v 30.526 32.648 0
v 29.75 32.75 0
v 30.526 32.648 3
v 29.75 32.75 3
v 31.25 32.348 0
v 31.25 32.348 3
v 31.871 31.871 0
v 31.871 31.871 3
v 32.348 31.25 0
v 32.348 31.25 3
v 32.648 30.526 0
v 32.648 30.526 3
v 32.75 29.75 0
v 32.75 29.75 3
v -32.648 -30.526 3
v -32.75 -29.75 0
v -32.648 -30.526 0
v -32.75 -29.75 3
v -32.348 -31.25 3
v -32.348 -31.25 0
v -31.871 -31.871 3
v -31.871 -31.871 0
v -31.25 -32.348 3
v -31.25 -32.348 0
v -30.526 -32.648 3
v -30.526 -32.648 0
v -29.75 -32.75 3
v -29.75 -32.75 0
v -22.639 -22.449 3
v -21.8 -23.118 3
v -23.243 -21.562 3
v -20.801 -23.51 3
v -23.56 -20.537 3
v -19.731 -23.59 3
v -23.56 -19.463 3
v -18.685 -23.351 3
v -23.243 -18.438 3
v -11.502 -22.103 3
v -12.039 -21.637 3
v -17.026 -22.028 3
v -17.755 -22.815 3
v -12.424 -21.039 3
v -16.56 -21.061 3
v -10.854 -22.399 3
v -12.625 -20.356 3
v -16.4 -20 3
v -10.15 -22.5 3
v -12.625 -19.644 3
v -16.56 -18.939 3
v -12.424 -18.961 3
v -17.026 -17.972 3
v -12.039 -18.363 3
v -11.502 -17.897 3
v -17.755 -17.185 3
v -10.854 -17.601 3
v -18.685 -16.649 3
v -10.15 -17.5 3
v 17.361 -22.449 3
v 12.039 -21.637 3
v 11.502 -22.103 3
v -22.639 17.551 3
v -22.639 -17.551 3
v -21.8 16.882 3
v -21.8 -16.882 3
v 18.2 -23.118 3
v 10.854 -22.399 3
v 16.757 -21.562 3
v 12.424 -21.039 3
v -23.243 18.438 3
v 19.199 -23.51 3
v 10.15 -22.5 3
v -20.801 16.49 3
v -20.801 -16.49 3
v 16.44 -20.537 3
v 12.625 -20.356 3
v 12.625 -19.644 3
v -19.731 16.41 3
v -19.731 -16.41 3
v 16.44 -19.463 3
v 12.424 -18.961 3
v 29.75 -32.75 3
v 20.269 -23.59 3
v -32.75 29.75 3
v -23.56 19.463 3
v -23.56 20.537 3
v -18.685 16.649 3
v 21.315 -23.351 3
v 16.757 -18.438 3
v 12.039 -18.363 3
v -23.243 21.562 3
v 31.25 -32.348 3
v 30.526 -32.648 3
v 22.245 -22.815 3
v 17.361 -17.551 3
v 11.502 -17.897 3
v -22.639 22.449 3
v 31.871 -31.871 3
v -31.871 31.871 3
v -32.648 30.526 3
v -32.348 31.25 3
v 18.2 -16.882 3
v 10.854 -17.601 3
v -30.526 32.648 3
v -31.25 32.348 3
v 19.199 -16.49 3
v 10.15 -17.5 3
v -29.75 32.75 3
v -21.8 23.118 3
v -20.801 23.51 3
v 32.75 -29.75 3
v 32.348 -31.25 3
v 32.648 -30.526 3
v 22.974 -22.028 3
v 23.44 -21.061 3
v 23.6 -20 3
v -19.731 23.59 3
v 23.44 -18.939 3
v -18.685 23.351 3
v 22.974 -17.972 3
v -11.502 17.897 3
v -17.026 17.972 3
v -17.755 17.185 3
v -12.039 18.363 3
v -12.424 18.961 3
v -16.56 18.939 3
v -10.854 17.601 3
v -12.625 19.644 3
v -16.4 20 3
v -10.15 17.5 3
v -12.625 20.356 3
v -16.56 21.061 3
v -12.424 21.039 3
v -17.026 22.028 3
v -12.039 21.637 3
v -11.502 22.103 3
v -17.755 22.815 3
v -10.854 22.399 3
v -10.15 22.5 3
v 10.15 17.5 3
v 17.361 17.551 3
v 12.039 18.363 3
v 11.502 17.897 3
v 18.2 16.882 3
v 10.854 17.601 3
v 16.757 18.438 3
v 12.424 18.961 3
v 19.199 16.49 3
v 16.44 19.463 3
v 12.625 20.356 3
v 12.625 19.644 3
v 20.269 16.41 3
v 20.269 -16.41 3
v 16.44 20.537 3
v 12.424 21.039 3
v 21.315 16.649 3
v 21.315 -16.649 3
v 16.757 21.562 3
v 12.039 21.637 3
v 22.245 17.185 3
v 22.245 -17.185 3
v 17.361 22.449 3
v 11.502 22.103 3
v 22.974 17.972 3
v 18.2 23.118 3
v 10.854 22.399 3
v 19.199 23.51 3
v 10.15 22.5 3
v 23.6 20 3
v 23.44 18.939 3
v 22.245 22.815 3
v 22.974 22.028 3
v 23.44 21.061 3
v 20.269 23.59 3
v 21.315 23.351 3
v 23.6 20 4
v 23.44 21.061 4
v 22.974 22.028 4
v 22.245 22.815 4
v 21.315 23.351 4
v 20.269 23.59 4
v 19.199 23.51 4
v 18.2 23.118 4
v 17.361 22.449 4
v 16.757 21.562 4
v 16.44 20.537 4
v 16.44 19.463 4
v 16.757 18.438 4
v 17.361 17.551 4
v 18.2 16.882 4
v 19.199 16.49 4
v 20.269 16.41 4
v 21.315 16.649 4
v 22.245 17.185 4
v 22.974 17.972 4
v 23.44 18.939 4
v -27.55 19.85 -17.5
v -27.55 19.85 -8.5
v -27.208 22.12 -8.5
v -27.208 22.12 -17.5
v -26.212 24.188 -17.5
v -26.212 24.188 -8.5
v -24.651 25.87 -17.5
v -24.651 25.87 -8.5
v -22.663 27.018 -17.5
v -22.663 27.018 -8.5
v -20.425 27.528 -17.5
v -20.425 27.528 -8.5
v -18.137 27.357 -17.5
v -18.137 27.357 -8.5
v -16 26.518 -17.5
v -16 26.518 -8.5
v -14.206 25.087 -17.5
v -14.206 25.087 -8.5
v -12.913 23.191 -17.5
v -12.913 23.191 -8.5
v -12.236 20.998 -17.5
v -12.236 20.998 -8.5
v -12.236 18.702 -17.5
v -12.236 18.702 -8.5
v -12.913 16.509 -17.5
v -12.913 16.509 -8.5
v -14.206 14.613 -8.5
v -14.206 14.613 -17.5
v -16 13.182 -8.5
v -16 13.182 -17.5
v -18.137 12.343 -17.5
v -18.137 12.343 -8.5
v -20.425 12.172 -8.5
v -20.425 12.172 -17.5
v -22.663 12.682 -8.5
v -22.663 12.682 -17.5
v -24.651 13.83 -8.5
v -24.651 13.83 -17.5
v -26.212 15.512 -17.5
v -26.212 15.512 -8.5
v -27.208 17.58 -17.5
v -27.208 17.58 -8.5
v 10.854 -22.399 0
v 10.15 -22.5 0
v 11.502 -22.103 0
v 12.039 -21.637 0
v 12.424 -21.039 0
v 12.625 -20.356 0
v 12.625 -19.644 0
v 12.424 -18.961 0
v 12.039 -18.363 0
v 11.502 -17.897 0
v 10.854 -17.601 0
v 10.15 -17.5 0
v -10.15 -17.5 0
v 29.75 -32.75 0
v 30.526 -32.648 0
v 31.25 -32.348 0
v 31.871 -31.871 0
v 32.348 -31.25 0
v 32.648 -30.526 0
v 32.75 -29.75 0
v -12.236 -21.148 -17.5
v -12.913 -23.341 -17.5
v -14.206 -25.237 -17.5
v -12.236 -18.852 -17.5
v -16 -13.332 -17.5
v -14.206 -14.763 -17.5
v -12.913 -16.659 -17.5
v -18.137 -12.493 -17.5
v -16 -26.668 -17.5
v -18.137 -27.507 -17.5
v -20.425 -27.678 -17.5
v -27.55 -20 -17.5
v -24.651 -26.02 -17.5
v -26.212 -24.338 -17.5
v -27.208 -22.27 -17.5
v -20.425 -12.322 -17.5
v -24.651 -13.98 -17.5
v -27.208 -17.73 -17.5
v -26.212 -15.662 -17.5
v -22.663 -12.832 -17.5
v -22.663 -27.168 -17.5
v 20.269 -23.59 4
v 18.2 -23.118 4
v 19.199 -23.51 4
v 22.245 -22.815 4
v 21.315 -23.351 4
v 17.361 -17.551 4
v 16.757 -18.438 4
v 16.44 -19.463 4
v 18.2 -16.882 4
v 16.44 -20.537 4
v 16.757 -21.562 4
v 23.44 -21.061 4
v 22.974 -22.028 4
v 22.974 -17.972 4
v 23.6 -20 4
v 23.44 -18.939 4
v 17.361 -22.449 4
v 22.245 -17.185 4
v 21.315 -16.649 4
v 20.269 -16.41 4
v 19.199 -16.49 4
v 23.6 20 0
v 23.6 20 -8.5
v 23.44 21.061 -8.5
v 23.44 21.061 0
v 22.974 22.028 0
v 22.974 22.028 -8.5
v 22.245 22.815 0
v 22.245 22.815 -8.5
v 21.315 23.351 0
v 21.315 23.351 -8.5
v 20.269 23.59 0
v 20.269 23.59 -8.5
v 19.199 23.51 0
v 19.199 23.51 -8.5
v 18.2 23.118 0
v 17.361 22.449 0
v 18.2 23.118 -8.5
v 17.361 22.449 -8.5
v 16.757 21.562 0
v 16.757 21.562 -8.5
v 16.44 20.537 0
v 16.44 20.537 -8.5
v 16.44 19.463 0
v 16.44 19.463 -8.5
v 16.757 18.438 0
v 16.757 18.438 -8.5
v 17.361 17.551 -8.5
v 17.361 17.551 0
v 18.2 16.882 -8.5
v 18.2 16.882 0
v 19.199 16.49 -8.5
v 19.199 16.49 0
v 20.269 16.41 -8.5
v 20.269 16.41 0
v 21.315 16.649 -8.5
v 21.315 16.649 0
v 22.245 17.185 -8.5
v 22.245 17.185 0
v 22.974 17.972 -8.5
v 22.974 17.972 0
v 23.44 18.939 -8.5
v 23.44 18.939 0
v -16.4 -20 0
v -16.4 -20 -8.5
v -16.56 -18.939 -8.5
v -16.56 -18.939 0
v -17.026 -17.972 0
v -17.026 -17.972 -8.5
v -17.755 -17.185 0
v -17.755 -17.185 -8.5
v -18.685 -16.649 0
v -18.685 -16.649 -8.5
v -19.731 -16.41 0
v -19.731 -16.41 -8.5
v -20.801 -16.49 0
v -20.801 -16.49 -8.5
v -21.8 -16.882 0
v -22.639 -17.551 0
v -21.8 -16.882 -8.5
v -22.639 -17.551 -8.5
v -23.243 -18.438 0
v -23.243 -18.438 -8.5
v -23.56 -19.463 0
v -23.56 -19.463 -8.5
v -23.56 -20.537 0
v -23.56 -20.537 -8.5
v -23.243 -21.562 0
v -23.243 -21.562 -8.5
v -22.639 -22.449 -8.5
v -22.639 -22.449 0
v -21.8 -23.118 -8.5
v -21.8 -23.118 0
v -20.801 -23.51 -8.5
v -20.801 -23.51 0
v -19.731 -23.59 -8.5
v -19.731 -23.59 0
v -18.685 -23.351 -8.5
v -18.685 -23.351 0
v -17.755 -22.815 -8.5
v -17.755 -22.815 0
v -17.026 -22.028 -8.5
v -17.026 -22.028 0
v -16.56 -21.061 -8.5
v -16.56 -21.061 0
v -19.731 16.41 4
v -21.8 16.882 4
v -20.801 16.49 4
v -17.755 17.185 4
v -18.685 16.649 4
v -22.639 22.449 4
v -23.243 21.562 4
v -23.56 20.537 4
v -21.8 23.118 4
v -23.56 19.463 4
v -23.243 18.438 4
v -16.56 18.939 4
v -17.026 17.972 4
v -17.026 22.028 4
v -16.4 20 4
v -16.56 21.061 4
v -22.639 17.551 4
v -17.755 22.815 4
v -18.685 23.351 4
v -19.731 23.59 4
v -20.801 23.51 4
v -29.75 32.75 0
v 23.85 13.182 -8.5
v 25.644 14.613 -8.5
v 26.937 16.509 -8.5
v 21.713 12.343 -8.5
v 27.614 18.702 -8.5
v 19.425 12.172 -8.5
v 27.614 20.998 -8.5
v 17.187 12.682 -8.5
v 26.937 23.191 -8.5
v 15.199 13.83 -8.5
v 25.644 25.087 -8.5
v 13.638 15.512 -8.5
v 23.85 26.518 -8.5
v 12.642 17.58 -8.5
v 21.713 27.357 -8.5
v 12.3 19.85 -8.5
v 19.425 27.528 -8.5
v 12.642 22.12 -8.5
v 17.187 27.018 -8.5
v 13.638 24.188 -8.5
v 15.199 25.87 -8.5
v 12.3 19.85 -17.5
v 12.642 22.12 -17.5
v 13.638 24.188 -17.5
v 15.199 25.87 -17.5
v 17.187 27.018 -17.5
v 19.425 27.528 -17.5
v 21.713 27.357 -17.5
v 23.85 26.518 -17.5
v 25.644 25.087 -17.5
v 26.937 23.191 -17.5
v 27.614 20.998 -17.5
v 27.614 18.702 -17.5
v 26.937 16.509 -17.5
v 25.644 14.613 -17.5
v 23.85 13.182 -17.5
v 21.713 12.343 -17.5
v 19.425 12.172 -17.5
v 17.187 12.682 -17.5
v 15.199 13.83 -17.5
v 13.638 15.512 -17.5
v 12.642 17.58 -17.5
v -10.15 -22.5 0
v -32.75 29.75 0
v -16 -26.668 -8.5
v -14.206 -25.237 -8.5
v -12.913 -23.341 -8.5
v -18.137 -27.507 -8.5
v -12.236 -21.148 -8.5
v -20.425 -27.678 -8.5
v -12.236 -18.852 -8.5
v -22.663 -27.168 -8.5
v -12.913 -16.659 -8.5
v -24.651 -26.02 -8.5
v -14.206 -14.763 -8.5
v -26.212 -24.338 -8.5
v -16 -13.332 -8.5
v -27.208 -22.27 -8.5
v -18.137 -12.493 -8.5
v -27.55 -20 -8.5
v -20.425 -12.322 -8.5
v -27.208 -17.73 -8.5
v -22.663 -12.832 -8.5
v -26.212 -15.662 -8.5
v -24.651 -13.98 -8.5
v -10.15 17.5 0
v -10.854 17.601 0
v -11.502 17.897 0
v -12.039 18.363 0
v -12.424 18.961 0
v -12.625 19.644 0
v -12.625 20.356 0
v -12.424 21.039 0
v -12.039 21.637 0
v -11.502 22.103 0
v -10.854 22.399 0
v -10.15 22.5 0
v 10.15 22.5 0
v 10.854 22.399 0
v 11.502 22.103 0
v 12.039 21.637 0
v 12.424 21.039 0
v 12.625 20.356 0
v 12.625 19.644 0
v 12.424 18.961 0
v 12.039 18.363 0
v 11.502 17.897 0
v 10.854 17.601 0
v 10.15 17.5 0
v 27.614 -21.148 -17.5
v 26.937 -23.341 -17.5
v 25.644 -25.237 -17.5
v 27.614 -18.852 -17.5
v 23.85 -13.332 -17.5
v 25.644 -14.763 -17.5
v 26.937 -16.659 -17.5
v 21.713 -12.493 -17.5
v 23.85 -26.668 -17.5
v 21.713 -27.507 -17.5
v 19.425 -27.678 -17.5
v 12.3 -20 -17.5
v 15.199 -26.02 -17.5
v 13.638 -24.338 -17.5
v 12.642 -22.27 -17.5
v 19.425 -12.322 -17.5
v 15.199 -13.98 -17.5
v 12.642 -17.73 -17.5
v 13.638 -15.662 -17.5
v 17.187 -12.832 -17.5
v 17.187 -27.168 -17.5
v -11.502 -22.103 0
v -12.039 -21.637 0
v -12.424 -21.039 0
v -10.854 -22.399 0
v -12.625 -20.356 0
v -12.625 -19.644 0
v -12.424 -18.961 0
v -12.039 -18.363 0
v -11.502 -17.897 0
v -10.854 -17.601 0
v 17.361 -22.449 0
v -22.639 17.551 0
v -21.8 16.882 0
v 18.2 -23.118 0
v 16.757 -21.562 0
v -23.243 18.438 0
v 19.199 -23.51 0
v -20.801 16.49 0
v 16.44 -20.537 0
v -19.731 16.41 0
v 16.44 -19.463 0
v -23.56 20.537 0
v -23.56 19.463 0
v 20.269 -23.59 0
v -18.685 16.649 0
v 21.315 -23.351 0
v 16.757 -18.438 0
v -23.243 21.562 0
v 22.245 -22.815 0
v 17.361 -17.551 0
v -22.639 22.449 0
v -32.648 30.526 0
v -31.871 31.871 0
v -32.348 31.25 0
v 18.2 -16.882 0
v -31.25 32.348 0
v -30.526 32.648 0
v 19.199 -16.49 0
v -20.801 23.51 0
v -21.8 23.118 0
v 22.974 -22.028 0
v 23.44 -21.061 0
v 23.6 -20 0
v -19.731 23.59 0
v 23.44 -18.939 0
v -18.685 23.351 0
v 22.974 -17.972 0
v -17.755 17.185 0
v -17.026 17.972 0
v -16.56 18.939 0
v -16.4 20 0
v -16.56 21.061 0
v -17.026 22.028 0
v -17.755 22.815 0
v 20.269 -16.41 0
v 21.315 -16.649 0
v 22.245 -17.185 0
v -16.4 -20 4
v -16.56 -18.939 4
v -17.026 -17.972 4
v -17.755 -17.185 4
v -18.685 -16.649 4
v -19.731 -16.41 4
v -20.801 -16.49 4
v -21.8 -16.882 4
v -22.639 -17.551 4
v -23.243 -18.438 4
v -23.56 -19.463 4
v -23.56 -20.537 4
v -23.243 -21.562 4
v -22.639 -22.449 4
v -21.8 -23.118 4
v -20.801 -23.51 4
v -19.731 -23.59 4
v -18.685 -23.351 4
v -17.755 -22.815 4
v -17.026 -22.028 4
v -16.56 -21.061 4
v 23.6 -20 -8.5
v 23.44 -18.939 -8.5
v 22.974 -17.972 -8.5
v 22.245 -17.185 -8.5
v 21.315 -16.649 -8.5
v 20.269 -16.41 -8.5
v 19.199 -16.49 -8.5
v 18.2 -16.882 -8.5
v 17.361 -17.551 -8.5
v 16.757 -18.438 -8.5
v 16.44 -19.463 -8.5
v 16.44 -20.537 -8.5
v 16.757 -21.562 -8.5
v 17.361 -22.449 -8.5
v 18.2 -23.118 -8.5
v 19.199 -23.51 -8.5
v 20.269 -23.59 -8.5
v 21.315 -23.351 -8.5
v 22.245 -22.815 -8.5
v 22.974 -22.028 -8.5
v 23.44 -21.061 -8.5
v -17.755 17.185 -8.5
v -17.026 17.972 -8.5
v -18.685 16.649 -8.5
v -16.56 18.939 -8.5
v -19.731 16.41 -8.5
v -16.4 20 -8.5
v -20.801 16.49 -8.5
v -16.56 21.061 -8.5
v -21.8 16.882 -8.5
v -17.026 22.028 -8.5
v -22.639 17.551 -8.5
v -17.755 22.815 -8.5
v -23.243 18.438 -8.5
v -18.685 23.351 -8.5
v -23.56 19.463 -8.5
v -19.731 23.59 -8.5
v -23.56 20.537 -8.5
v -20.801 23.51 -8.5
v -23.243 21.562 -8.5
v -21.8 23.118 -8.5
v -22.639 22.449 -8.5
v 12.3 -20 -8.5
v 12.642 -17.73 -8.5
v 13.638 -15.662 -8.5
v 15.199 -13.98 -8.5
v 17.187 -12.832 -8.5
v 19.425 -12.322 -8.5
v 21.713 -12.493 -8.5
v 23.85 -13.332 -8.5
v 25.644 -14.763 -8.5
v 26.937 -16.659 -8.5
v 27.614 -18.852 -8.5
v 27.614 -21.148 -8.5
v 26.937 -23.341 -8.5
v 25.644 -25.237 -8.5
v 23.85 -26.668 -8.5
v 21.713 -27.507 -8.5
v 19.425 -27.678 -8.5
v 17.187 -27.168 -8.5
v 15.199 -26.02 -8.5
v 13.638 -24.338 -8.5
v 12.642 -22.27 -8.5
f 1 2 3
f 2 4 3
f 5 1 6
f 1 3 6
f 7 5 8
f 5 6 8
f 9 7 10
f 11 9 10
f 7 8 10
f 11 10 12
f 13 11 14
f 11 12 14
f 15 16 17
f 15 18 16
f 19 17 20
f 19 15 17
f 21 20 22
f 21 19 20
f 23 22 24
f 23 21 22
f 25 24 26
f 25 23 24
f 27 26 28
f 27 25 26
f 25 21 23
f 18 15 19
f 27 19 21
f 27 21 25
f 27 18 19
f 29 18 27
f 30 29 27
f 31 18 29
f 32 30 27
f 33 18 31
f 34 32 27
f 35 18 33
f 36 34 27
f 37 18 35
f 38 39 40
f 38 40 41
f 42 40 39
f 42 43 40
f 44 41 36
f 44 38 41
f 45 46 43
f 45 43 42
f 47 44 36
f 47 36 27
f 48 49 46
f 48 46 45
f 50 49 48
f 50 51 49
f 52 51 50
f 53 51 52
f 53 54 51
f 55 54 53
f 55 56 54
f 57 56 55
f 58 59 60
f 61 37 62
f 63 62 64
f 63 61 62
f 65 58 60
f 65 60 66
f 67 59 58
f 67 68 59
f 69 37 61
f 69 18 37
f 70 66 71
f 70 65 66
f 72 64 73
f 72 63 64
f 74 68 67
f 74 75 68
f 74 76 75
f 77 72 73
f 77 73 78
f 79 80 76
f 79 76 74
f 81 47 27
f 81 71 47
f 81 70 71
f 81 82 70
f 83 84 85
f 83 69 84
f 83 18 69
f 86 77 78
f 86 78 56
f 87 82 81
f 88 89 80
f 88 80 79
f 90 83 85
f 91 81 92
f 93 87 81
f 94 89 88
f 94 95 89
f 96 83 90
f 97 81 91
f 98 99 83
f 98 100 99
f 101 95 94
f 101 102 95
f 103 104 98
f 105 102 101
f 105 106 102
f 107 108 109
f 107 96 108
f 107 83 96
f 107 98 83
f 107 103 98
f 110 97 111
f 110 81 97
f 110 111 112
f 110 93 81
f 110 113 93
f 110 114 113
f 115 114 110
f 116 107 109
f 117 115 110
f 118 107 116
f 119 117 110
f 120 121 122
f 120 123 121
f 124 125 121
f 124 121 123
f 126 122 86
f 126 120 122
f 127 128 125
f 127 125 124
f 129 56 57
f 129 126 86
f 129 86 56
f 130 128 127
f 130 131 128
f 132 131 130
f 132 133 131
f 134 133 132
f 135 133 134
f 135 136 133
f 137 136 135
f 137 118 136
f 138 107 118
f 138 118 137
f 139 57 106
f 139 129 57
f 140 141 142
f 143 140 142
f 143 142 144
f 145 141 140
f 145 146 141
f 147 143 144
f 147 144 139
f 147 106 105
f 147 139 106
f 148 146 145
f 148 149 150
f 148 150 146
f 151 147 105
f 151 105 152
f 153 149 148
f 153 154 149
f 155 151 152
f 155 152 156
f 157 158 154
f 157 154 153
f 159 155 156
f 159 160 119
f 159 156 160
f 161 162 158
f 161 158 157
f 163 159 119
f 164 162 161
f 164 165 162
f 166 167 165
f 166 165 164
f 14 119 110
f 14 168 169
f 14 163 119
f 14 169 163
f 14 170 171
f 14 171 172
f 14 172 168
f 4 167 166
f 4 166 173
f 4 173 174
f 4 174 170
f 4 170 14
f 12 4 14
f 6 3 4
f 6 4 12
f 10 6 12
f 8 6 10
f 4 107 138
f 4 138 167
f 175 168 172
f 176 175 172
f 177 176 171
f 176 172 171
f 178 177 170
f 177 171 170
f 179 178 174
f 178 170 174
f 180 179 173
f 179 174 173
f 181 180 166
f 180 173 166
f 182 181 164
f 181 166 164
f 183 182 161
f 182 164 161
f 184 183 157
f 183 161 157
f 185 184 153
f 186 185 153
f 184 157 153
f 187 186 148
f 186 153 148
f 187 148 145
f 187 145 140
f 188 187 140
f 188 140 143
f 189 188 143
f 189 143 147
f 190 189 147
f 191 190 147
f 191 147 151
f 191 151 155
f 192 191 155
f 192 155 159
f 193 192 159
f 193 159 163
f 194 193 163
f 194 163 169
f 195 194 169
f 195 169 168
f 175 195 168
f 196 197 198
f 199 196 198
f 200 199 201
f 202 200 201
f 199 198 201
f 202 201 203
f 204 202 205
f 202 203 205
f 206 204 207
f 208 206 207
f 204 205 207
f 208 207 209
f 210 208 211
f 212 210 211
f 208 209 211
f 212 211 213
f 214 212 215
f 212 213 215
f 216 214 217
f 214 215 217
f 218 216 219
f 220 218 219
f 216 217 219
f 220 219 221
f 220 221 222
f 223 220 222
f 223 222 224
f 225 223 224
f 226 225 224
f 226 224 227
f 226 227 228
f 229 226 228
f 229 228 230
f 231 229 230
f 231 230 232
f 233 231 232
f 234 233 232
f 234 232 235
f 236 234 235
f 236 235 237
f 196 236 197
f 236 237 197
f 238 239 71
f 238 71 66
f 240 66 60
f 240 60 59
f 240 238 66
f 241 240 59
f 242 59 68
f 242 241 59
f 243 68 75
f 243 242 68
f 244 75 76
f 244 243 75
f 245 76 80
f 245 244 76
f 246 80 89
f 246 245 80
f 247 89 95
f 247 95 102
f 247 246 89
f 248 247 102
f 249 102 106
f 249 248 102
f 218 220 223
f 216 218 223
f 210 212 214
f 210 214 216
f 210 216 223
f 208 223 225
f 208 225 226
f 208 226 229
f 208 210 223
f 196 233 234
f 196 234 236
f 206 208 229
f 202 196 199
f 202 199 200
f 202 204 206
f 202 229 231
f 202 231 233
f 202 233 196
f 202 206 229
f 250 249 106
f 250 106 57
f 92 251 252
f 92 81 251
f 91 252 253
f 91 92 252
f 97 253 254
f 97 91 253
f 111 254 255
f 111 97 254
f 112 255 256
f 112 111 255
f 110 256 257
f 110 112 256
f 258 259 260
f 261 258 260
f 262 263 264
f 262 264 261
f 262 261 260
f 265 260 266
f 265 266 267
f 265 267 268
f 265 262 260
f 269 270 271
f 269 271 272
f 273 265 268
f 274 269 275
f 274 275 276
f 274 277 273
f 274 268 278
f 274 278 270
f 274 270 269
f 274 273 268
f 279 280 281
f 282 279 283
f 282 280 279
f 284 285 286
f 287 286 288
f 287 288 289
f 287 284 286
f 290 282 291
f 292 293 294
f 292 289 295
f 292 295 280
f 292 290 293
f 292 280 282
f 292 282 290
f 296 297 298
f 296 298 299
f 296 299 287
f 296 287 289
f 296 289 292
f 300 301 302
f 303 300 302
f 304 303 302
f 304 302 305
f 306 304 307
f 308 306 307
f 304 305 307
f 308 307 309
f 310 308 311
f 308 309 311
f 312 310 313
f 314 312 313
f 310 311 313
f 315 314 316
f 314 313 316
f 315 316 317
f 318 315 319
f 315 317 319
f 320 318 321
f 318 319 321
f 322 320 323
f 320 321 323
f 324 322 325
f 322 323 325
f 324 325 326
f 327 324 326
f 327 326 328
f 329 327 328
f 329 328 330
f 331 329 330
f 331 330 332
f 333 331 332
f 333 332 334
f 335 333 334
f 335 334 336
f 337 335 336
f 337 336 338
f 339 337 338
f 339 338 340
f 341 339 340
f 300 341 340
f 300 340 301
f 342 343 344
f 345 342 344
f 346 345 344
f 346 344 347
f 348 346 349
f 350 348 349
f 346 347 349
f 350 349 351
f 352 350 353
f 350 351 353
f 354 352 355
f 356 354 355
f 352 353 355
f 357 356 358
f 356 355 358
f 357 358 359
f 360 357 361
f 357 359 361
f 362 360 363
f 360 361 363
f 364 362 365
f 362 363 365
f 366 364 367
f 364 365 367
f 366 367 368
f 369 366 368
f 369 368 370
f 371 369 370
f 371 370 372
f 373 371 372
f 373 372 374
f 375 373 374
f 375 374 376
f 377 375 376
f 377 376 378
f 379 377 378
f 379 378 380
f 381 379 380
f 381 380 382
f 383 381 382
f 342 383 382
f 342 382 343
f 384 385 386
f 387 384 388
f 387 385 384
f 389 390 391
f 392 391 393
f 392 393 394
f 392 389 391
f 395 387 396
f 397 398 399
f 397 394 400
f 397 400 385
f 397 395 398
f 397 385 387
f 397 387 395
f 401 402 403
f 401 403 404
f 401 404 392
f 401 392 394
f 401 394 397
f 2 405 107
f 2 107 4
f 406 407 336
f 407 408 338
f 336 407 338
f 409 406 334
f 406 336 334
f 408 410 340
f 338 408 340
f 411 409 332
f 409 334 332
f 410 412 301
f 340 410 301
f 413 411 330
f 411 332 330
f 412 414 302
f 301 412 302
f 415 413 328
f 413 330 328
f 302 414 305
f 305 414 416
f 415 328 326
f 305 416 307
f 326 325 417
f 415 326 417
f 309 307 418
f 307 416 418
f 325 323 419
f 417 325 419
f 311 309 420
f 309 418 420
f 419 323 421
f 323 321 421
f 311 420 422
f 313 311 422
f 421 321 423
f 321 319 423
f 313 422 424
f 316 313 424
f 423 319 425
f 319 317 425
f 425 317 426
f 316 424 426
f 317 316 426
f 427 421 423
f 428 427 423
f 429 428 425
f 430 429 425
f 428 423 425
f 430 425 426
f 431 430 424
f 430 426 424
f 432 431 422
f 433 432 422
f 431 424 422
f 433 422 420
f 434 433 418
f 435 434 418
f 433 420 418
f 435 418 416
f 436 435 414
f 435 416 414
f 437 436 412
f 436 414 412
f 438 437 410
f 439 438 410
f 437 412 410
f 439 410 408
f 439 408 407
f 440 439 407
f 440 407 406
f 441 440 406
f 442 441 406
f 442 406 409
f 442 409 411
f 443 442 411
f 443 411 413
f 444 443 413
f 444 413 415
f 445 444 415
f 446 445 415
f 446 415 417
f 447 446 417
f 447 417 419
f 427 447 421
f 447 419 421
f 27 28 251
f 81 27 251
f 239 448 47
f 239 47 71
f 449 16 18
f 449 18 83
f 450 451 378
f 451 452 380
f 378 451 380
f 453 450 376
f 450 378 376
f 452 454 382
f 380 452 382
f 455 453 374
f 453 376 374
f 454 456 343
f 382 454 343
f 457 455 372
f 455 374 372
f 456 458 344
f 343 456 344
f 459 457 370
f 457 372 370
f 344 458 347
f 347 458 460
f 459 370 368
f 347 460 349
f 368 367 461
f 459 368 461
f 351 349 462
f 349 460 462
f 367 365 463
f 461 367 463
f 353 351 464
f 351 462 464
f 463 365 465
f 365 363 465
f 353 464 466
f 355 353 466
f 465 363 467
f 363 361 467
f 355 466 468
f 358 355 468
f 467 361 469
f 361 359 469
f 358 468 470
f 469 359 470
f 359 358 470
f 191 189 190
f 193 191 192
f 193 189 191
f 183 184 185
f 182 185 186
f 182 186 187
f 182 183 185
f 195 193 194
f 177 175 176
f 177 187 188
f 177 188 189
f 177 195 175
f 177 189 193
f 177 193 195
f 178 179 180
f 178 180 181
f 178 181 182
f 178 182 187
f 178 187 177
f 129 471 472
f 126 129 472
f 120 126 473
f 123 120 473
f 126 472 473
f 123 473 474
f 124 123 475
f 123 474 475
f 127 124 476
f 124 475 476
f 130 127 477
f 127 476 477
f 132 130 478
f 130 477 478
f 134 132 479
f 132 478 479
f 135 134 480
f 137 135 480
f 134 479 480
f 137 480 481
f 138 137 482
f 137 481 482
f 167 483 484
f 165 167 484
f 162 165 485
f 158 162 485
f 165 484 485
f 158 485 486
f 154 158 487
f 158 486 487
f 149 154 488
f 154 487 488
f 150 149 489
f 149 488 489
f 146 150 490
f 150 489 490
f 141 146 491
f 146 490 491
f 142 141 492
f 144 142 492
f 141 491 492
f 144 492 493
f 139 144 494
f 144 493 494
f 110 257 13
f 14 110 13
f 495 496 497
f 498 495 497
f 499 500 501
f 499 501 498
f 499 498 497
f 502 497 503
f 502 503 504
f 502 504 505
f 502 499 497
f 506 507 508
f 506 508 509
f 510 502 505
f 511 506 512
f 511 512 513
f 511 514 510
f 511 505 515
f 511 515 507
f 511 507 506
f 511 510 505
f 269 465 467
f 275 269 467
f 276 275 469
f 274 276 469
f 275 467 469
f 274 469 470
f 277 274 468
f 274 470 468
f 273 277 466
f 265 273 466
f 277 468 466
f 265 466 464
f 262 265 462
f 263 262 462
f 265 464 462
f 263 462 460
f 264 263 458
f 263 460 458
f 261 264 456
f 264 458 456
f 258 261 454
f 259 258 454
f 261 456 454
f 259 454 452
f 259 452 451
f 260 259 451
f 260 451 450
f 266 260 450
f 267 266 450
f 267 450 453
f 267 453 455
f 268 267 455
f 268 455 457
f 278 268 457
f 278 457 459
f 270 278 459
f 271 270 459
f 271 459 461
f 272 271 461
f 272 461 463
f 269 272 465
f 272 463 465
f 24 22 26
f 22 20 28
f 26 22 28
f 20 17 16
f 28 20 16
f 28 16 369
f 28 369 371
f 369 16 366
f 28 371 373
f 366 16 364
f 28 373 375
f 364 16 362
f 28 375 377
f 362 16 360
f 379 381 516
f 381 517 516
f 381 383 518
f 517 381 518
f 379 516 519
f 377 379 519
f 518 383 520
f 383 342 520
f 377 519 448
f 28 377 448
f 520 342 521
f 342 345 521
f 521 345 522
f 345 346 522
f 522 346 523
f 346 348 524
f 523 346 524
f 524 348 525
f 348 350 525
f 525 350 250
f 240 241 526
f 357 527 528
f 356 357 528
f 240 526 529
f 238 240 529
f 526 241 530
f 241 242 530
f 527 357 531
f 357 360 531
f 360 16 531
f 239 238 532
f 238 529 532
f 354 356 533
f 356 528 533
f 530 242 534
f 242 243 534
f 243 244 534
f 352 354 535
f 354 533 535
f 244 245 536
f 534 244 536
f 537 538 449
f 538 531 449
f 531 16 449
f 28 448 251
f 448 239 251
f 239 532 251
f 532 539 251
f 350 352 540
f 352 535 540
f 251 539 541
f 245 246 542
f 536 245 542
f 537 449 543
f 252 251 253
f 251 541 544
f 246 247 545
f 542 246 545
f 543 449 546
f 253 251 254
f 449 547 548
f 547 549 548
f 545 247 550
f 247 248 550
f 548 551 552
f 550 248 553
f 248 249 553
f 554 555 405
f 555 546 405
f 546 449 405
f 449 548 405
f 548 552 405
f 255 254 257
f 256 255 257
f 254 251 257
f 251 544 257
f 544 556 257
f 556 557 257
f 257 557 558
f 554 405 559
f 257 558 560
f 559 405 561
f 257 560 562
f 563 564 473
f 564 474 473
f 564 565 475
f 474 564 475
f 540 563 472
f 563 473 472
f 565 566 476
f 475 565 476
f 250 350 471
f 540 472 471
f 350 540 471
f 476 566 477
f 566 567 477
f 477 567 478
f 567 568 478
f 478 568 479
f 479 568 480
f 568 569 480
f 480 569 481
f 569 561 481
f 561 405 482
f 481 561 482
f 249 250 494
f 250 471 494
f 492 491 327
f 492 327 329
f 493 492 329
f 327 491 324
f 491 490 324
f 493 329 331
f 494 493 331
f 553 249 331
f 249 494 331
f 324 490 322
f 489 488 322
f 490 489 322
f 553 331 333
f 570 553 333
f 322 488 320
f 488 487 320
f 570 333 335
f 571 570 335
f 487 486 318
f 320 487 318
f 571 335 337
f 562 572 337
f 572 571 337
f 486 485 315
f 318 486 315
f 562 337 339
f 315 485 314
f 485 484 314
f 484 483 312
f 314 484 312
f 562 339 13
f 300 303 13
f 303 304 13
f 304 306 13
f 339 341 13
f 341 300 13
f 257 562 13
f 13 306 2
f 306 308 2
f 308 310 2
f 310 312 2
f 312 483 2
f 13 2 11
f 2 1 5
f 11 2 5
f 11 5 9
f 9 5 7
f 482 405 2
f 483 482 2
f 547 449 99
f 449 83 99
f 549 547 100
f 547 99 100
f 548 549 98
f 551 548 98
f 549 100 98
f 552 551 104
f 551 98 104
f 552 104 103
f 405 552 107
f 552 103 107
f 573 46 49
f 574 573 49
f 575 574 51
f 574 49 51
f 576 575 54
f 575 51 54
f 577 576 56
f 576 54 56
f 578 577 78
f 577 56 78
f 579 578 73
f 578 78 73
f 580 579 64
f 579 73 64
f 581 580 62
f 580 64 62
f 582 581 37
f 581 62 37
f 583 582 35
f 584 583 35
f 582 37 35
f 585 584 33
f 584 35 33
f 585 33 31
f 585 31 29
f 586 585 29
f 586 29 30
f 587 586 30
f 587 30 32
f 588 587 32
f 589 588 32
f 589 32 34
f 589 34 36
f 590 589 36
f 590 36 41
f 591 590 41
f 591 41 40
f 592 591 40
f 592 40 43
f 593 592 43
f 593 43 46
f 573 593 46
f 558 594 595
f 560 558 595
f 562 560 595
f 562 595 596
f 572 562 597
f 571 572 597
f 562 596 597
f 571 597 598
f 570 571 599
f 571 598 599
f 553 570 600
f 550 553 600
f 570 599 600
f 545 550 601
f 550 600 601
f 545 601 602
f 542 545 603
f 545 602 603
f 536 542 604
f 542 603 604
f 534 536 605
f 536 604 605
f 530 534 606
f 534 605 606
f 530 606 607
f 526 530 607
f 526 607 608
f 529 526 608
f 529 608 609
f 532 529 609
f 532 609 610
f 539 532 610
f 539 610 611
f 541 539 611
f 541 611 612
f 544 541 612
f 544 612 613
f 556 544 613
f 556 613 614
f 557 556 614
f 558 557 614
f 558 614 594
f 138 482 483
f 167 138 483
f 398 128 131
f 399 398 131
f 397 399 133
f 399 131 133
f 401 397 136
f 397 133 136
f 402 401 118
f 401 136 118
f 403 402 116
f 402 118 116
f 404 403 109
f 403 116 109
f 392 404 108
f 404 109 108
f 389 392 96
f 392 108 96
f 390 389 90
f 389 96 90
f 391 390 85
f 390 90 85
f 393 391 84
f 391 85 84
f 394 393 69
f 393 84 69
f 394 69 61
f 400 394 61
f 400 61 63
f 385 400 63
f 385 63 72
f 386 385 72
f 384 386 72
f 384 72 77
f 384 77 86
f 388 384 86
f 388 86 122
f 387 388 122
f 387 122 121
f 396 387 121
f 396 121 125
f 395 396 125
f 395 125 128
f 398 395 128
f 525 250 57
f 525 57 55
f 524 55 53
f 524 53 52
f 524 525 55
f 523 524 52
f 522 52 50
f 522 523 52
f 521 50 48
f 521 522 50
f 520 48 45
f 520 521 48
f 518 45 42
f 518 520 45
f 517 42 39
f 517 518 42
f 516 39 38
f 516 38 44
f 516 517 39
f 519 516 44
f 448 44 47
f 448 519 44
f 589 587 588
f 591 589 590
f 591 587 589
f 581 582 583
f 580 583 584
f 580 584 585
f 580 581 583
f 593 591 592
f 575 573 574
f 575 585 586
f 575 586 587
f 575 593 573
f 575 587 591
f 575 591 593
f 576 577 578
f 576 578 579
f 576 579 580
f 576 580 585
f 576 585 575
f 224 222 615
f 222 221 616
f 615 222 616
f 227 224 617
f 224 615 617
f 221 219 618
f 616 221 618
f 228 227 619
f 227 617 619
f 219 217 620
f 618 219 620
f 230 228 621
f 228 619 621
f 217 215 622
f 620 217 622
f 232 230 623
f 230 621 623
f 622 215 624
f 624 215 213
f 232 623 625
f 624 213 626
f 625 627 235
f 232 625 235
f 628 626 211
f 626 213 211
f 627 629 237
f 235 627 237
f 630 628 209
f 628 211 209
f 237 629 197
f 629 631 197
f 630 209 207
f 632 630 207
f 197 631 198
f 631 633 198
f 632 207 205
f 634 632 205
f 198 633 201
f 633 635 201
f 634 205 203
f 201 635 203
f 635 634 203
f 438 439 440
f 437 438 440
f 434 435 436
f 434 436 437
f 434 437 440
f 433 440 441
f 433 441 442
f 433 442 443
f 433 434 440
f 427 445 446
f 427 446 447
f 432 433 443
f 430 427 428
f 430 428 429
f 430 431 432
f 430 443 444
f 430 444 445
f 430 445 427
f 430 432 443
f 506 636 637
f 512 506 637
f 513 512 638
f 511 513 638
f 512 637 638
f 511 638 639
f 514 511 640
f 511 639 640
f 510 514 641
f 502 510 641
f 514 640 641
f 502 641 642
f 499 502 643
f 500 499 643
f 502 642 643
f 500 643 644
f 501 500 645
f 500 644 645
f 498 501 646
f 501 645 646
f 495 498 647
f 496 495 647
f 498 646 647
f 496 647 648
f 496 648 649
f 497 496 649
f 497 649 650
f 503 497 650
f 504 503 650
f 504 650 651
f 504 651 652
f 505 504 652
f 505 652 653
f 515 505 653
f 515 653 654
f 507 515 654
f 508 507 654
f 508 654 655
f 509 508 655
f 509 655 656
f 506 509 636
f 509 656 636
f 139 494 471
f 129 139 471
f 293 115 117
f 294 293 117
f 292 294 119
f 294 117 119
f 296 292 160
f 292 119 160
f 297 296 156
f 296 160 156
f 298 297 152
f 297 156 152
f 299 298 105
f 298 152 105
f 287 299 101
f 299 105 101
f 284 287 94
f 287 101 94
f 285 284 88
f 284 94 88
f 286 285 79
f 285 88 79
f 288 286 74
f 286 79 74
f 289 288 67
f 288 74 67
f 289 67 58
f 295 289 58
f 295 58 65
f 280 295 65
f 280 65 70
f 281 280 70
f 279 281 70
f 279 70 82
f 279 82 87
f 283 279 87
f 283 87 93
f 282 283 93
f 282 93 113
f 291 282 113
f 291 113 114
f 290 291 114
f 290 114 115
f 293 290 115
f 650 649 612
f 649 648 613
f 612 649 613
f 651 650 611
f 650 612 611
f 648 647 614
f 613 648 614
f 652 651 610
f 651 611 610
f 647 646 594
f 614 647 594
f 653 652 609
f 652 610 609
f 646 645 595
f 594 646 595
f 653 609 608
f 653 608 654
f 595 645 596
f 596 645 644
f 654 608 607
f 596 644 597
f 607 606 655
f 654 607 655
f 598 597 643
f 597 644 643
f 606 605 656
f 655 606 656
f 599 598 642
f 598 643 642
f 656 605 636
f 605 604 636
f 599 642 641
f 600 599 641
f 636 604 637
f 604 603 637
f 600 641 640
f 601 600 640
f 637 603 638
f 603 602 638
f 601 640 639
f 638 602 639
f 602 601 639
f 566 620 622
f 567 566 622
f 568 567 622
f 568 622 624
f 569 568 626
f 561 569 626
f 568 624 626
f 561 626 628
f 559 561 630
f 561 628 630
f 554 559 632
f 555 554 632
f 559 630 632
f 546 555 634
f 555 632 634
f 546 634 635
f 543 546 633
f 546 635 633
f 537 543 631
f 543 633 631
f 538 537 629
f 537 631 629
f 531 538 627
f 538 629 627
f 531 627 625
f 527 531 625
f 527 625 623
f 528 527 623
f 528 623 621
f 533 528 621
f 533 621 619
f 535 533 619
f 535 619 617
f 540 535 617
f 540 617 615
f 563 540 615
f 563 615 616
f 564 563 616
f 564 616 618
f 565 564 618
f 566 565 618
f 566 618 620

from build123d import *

# Parameters (mm, degrees)
SKETCH_1_W           = 65.5
SKETCH_1_H           = 65.5
SKETCH_1_R           = 3.6
EXTRUDE_1_DEPTH      = 3
FILLET_1_R           = 3
EXTRUDE_2_DEPTH      = 1
EXTRUDE_2_DEPTH_BACK = 11.5
SKETCH_3_R           = 3.6
SKETCH_4_R           = 7.7
EXTRUDE_3_DEPTH      = 9


with BuildPart() as part:
    # 草图1 → 凸台-拉伸1 (new body)
    with BuildSketch(Plane.XY):
        Rectangle(SKETCH_1_W, SKETCH_1_H)
        with Locations((-20, 20)):
            Circle(SKETCH_1_R, mode=Mode.SUBTRACT)
        with Locations(Location((20, 20, 0), (0, 0, 180))):
            Circle(SKETCH_1_R, mode=Mode.SUBTRACT)
        with Locations((20, -20)):
            Circle(SKETCH_1_R, mode=Mode.SUBTRACT)
        with Locations(Location((-20, -20, 0), (0, 0, 180))):
            Circle(SKETCH_1_R, mode=Mode.SUBTRACT)
        with BuildLine():
            Line((-10.15, 22.5), (10.15, 22.5))
            ThreePointArc((10.15, 22.5), (12.65, 20), (10.15, 17.5))
            Line((10.15, 17.5), (-10.15, 17.5))
            ThreePointArc((-10.15, 17.5), (-12.65, 20), (-10.15, 22.5))
        make_face(mode=Mode.SUBTRACT)
        with BuildLine():
            Line((-10.15, -22.5), (10.15, -22.5))
            ThreePointArc((10.15, -22.5), (12.65, -20), (10.15, -17.5))
            Line((10.15, -17.5), (-10.15, -17.5))
            ThreePointArc((-10.15, -17.5), (-12.65, -20), (-10.15, -22.5))
        make_face(mode=Mode.SUBTRACT)
    extrude(amount=EXTRUDE_1_DEPTH)

    # 圆角1
    fillet_1_edges = [part.edges().sort_by_distance(p)[0] for p in [
        (-32.75, 32.75, 1.5),
        (32.75, 32.75, 1.5),
        (32.75, -32.75, 1.5),
        (-32.75, -32.75, 1.5),
    ]]
    fillet(fillet_1_edges, radius=FILLET_1_R)

    # 草图3 → 凸台-拉伸2 (add, two sides: drawn at the far end of the back side and taken through both)
    with BuildSketch(Plane.XY.offset(3).offset(-EXTRUDE_2_DEPTH_BACK)):
        with Locations((-20, 20)):
            Circle(SKETCH_3_R)
        with Locations((-20, -20)):
            Circle(SKETCH_3_R)
        with Locations((20, 20)):
            Circle(SKETCH_3_R)
        with Locations((20, -20)):
            Circle(SKETCH_3_R)
    extrude(amount=EXTRUDE_2_DEPTH + EXTRUDE_2_DEPTH_BACK)

    # 草图4 → 凸台-拉伸3 (add)
    with BuildSketch(Plane(origin=(0, 0, -8.5), x_dir=(-1, 0, 0), z_dir=(0, 0, -1))):
        with Locations((-20, -20)):
            Circle(SKETCH_4_R)
        with Locations((-20, 19.85)):
            Circle(SKETCH_4_R)
        with Locations((19.85, 19.85)):
            Circle(SKETCH_4_R)
        with Locations((19.85, -20)):
            Circle(SKETCH_4_R)
    extrude(amount=EXTRUDE_3_DEPTH)


solid = part.part
